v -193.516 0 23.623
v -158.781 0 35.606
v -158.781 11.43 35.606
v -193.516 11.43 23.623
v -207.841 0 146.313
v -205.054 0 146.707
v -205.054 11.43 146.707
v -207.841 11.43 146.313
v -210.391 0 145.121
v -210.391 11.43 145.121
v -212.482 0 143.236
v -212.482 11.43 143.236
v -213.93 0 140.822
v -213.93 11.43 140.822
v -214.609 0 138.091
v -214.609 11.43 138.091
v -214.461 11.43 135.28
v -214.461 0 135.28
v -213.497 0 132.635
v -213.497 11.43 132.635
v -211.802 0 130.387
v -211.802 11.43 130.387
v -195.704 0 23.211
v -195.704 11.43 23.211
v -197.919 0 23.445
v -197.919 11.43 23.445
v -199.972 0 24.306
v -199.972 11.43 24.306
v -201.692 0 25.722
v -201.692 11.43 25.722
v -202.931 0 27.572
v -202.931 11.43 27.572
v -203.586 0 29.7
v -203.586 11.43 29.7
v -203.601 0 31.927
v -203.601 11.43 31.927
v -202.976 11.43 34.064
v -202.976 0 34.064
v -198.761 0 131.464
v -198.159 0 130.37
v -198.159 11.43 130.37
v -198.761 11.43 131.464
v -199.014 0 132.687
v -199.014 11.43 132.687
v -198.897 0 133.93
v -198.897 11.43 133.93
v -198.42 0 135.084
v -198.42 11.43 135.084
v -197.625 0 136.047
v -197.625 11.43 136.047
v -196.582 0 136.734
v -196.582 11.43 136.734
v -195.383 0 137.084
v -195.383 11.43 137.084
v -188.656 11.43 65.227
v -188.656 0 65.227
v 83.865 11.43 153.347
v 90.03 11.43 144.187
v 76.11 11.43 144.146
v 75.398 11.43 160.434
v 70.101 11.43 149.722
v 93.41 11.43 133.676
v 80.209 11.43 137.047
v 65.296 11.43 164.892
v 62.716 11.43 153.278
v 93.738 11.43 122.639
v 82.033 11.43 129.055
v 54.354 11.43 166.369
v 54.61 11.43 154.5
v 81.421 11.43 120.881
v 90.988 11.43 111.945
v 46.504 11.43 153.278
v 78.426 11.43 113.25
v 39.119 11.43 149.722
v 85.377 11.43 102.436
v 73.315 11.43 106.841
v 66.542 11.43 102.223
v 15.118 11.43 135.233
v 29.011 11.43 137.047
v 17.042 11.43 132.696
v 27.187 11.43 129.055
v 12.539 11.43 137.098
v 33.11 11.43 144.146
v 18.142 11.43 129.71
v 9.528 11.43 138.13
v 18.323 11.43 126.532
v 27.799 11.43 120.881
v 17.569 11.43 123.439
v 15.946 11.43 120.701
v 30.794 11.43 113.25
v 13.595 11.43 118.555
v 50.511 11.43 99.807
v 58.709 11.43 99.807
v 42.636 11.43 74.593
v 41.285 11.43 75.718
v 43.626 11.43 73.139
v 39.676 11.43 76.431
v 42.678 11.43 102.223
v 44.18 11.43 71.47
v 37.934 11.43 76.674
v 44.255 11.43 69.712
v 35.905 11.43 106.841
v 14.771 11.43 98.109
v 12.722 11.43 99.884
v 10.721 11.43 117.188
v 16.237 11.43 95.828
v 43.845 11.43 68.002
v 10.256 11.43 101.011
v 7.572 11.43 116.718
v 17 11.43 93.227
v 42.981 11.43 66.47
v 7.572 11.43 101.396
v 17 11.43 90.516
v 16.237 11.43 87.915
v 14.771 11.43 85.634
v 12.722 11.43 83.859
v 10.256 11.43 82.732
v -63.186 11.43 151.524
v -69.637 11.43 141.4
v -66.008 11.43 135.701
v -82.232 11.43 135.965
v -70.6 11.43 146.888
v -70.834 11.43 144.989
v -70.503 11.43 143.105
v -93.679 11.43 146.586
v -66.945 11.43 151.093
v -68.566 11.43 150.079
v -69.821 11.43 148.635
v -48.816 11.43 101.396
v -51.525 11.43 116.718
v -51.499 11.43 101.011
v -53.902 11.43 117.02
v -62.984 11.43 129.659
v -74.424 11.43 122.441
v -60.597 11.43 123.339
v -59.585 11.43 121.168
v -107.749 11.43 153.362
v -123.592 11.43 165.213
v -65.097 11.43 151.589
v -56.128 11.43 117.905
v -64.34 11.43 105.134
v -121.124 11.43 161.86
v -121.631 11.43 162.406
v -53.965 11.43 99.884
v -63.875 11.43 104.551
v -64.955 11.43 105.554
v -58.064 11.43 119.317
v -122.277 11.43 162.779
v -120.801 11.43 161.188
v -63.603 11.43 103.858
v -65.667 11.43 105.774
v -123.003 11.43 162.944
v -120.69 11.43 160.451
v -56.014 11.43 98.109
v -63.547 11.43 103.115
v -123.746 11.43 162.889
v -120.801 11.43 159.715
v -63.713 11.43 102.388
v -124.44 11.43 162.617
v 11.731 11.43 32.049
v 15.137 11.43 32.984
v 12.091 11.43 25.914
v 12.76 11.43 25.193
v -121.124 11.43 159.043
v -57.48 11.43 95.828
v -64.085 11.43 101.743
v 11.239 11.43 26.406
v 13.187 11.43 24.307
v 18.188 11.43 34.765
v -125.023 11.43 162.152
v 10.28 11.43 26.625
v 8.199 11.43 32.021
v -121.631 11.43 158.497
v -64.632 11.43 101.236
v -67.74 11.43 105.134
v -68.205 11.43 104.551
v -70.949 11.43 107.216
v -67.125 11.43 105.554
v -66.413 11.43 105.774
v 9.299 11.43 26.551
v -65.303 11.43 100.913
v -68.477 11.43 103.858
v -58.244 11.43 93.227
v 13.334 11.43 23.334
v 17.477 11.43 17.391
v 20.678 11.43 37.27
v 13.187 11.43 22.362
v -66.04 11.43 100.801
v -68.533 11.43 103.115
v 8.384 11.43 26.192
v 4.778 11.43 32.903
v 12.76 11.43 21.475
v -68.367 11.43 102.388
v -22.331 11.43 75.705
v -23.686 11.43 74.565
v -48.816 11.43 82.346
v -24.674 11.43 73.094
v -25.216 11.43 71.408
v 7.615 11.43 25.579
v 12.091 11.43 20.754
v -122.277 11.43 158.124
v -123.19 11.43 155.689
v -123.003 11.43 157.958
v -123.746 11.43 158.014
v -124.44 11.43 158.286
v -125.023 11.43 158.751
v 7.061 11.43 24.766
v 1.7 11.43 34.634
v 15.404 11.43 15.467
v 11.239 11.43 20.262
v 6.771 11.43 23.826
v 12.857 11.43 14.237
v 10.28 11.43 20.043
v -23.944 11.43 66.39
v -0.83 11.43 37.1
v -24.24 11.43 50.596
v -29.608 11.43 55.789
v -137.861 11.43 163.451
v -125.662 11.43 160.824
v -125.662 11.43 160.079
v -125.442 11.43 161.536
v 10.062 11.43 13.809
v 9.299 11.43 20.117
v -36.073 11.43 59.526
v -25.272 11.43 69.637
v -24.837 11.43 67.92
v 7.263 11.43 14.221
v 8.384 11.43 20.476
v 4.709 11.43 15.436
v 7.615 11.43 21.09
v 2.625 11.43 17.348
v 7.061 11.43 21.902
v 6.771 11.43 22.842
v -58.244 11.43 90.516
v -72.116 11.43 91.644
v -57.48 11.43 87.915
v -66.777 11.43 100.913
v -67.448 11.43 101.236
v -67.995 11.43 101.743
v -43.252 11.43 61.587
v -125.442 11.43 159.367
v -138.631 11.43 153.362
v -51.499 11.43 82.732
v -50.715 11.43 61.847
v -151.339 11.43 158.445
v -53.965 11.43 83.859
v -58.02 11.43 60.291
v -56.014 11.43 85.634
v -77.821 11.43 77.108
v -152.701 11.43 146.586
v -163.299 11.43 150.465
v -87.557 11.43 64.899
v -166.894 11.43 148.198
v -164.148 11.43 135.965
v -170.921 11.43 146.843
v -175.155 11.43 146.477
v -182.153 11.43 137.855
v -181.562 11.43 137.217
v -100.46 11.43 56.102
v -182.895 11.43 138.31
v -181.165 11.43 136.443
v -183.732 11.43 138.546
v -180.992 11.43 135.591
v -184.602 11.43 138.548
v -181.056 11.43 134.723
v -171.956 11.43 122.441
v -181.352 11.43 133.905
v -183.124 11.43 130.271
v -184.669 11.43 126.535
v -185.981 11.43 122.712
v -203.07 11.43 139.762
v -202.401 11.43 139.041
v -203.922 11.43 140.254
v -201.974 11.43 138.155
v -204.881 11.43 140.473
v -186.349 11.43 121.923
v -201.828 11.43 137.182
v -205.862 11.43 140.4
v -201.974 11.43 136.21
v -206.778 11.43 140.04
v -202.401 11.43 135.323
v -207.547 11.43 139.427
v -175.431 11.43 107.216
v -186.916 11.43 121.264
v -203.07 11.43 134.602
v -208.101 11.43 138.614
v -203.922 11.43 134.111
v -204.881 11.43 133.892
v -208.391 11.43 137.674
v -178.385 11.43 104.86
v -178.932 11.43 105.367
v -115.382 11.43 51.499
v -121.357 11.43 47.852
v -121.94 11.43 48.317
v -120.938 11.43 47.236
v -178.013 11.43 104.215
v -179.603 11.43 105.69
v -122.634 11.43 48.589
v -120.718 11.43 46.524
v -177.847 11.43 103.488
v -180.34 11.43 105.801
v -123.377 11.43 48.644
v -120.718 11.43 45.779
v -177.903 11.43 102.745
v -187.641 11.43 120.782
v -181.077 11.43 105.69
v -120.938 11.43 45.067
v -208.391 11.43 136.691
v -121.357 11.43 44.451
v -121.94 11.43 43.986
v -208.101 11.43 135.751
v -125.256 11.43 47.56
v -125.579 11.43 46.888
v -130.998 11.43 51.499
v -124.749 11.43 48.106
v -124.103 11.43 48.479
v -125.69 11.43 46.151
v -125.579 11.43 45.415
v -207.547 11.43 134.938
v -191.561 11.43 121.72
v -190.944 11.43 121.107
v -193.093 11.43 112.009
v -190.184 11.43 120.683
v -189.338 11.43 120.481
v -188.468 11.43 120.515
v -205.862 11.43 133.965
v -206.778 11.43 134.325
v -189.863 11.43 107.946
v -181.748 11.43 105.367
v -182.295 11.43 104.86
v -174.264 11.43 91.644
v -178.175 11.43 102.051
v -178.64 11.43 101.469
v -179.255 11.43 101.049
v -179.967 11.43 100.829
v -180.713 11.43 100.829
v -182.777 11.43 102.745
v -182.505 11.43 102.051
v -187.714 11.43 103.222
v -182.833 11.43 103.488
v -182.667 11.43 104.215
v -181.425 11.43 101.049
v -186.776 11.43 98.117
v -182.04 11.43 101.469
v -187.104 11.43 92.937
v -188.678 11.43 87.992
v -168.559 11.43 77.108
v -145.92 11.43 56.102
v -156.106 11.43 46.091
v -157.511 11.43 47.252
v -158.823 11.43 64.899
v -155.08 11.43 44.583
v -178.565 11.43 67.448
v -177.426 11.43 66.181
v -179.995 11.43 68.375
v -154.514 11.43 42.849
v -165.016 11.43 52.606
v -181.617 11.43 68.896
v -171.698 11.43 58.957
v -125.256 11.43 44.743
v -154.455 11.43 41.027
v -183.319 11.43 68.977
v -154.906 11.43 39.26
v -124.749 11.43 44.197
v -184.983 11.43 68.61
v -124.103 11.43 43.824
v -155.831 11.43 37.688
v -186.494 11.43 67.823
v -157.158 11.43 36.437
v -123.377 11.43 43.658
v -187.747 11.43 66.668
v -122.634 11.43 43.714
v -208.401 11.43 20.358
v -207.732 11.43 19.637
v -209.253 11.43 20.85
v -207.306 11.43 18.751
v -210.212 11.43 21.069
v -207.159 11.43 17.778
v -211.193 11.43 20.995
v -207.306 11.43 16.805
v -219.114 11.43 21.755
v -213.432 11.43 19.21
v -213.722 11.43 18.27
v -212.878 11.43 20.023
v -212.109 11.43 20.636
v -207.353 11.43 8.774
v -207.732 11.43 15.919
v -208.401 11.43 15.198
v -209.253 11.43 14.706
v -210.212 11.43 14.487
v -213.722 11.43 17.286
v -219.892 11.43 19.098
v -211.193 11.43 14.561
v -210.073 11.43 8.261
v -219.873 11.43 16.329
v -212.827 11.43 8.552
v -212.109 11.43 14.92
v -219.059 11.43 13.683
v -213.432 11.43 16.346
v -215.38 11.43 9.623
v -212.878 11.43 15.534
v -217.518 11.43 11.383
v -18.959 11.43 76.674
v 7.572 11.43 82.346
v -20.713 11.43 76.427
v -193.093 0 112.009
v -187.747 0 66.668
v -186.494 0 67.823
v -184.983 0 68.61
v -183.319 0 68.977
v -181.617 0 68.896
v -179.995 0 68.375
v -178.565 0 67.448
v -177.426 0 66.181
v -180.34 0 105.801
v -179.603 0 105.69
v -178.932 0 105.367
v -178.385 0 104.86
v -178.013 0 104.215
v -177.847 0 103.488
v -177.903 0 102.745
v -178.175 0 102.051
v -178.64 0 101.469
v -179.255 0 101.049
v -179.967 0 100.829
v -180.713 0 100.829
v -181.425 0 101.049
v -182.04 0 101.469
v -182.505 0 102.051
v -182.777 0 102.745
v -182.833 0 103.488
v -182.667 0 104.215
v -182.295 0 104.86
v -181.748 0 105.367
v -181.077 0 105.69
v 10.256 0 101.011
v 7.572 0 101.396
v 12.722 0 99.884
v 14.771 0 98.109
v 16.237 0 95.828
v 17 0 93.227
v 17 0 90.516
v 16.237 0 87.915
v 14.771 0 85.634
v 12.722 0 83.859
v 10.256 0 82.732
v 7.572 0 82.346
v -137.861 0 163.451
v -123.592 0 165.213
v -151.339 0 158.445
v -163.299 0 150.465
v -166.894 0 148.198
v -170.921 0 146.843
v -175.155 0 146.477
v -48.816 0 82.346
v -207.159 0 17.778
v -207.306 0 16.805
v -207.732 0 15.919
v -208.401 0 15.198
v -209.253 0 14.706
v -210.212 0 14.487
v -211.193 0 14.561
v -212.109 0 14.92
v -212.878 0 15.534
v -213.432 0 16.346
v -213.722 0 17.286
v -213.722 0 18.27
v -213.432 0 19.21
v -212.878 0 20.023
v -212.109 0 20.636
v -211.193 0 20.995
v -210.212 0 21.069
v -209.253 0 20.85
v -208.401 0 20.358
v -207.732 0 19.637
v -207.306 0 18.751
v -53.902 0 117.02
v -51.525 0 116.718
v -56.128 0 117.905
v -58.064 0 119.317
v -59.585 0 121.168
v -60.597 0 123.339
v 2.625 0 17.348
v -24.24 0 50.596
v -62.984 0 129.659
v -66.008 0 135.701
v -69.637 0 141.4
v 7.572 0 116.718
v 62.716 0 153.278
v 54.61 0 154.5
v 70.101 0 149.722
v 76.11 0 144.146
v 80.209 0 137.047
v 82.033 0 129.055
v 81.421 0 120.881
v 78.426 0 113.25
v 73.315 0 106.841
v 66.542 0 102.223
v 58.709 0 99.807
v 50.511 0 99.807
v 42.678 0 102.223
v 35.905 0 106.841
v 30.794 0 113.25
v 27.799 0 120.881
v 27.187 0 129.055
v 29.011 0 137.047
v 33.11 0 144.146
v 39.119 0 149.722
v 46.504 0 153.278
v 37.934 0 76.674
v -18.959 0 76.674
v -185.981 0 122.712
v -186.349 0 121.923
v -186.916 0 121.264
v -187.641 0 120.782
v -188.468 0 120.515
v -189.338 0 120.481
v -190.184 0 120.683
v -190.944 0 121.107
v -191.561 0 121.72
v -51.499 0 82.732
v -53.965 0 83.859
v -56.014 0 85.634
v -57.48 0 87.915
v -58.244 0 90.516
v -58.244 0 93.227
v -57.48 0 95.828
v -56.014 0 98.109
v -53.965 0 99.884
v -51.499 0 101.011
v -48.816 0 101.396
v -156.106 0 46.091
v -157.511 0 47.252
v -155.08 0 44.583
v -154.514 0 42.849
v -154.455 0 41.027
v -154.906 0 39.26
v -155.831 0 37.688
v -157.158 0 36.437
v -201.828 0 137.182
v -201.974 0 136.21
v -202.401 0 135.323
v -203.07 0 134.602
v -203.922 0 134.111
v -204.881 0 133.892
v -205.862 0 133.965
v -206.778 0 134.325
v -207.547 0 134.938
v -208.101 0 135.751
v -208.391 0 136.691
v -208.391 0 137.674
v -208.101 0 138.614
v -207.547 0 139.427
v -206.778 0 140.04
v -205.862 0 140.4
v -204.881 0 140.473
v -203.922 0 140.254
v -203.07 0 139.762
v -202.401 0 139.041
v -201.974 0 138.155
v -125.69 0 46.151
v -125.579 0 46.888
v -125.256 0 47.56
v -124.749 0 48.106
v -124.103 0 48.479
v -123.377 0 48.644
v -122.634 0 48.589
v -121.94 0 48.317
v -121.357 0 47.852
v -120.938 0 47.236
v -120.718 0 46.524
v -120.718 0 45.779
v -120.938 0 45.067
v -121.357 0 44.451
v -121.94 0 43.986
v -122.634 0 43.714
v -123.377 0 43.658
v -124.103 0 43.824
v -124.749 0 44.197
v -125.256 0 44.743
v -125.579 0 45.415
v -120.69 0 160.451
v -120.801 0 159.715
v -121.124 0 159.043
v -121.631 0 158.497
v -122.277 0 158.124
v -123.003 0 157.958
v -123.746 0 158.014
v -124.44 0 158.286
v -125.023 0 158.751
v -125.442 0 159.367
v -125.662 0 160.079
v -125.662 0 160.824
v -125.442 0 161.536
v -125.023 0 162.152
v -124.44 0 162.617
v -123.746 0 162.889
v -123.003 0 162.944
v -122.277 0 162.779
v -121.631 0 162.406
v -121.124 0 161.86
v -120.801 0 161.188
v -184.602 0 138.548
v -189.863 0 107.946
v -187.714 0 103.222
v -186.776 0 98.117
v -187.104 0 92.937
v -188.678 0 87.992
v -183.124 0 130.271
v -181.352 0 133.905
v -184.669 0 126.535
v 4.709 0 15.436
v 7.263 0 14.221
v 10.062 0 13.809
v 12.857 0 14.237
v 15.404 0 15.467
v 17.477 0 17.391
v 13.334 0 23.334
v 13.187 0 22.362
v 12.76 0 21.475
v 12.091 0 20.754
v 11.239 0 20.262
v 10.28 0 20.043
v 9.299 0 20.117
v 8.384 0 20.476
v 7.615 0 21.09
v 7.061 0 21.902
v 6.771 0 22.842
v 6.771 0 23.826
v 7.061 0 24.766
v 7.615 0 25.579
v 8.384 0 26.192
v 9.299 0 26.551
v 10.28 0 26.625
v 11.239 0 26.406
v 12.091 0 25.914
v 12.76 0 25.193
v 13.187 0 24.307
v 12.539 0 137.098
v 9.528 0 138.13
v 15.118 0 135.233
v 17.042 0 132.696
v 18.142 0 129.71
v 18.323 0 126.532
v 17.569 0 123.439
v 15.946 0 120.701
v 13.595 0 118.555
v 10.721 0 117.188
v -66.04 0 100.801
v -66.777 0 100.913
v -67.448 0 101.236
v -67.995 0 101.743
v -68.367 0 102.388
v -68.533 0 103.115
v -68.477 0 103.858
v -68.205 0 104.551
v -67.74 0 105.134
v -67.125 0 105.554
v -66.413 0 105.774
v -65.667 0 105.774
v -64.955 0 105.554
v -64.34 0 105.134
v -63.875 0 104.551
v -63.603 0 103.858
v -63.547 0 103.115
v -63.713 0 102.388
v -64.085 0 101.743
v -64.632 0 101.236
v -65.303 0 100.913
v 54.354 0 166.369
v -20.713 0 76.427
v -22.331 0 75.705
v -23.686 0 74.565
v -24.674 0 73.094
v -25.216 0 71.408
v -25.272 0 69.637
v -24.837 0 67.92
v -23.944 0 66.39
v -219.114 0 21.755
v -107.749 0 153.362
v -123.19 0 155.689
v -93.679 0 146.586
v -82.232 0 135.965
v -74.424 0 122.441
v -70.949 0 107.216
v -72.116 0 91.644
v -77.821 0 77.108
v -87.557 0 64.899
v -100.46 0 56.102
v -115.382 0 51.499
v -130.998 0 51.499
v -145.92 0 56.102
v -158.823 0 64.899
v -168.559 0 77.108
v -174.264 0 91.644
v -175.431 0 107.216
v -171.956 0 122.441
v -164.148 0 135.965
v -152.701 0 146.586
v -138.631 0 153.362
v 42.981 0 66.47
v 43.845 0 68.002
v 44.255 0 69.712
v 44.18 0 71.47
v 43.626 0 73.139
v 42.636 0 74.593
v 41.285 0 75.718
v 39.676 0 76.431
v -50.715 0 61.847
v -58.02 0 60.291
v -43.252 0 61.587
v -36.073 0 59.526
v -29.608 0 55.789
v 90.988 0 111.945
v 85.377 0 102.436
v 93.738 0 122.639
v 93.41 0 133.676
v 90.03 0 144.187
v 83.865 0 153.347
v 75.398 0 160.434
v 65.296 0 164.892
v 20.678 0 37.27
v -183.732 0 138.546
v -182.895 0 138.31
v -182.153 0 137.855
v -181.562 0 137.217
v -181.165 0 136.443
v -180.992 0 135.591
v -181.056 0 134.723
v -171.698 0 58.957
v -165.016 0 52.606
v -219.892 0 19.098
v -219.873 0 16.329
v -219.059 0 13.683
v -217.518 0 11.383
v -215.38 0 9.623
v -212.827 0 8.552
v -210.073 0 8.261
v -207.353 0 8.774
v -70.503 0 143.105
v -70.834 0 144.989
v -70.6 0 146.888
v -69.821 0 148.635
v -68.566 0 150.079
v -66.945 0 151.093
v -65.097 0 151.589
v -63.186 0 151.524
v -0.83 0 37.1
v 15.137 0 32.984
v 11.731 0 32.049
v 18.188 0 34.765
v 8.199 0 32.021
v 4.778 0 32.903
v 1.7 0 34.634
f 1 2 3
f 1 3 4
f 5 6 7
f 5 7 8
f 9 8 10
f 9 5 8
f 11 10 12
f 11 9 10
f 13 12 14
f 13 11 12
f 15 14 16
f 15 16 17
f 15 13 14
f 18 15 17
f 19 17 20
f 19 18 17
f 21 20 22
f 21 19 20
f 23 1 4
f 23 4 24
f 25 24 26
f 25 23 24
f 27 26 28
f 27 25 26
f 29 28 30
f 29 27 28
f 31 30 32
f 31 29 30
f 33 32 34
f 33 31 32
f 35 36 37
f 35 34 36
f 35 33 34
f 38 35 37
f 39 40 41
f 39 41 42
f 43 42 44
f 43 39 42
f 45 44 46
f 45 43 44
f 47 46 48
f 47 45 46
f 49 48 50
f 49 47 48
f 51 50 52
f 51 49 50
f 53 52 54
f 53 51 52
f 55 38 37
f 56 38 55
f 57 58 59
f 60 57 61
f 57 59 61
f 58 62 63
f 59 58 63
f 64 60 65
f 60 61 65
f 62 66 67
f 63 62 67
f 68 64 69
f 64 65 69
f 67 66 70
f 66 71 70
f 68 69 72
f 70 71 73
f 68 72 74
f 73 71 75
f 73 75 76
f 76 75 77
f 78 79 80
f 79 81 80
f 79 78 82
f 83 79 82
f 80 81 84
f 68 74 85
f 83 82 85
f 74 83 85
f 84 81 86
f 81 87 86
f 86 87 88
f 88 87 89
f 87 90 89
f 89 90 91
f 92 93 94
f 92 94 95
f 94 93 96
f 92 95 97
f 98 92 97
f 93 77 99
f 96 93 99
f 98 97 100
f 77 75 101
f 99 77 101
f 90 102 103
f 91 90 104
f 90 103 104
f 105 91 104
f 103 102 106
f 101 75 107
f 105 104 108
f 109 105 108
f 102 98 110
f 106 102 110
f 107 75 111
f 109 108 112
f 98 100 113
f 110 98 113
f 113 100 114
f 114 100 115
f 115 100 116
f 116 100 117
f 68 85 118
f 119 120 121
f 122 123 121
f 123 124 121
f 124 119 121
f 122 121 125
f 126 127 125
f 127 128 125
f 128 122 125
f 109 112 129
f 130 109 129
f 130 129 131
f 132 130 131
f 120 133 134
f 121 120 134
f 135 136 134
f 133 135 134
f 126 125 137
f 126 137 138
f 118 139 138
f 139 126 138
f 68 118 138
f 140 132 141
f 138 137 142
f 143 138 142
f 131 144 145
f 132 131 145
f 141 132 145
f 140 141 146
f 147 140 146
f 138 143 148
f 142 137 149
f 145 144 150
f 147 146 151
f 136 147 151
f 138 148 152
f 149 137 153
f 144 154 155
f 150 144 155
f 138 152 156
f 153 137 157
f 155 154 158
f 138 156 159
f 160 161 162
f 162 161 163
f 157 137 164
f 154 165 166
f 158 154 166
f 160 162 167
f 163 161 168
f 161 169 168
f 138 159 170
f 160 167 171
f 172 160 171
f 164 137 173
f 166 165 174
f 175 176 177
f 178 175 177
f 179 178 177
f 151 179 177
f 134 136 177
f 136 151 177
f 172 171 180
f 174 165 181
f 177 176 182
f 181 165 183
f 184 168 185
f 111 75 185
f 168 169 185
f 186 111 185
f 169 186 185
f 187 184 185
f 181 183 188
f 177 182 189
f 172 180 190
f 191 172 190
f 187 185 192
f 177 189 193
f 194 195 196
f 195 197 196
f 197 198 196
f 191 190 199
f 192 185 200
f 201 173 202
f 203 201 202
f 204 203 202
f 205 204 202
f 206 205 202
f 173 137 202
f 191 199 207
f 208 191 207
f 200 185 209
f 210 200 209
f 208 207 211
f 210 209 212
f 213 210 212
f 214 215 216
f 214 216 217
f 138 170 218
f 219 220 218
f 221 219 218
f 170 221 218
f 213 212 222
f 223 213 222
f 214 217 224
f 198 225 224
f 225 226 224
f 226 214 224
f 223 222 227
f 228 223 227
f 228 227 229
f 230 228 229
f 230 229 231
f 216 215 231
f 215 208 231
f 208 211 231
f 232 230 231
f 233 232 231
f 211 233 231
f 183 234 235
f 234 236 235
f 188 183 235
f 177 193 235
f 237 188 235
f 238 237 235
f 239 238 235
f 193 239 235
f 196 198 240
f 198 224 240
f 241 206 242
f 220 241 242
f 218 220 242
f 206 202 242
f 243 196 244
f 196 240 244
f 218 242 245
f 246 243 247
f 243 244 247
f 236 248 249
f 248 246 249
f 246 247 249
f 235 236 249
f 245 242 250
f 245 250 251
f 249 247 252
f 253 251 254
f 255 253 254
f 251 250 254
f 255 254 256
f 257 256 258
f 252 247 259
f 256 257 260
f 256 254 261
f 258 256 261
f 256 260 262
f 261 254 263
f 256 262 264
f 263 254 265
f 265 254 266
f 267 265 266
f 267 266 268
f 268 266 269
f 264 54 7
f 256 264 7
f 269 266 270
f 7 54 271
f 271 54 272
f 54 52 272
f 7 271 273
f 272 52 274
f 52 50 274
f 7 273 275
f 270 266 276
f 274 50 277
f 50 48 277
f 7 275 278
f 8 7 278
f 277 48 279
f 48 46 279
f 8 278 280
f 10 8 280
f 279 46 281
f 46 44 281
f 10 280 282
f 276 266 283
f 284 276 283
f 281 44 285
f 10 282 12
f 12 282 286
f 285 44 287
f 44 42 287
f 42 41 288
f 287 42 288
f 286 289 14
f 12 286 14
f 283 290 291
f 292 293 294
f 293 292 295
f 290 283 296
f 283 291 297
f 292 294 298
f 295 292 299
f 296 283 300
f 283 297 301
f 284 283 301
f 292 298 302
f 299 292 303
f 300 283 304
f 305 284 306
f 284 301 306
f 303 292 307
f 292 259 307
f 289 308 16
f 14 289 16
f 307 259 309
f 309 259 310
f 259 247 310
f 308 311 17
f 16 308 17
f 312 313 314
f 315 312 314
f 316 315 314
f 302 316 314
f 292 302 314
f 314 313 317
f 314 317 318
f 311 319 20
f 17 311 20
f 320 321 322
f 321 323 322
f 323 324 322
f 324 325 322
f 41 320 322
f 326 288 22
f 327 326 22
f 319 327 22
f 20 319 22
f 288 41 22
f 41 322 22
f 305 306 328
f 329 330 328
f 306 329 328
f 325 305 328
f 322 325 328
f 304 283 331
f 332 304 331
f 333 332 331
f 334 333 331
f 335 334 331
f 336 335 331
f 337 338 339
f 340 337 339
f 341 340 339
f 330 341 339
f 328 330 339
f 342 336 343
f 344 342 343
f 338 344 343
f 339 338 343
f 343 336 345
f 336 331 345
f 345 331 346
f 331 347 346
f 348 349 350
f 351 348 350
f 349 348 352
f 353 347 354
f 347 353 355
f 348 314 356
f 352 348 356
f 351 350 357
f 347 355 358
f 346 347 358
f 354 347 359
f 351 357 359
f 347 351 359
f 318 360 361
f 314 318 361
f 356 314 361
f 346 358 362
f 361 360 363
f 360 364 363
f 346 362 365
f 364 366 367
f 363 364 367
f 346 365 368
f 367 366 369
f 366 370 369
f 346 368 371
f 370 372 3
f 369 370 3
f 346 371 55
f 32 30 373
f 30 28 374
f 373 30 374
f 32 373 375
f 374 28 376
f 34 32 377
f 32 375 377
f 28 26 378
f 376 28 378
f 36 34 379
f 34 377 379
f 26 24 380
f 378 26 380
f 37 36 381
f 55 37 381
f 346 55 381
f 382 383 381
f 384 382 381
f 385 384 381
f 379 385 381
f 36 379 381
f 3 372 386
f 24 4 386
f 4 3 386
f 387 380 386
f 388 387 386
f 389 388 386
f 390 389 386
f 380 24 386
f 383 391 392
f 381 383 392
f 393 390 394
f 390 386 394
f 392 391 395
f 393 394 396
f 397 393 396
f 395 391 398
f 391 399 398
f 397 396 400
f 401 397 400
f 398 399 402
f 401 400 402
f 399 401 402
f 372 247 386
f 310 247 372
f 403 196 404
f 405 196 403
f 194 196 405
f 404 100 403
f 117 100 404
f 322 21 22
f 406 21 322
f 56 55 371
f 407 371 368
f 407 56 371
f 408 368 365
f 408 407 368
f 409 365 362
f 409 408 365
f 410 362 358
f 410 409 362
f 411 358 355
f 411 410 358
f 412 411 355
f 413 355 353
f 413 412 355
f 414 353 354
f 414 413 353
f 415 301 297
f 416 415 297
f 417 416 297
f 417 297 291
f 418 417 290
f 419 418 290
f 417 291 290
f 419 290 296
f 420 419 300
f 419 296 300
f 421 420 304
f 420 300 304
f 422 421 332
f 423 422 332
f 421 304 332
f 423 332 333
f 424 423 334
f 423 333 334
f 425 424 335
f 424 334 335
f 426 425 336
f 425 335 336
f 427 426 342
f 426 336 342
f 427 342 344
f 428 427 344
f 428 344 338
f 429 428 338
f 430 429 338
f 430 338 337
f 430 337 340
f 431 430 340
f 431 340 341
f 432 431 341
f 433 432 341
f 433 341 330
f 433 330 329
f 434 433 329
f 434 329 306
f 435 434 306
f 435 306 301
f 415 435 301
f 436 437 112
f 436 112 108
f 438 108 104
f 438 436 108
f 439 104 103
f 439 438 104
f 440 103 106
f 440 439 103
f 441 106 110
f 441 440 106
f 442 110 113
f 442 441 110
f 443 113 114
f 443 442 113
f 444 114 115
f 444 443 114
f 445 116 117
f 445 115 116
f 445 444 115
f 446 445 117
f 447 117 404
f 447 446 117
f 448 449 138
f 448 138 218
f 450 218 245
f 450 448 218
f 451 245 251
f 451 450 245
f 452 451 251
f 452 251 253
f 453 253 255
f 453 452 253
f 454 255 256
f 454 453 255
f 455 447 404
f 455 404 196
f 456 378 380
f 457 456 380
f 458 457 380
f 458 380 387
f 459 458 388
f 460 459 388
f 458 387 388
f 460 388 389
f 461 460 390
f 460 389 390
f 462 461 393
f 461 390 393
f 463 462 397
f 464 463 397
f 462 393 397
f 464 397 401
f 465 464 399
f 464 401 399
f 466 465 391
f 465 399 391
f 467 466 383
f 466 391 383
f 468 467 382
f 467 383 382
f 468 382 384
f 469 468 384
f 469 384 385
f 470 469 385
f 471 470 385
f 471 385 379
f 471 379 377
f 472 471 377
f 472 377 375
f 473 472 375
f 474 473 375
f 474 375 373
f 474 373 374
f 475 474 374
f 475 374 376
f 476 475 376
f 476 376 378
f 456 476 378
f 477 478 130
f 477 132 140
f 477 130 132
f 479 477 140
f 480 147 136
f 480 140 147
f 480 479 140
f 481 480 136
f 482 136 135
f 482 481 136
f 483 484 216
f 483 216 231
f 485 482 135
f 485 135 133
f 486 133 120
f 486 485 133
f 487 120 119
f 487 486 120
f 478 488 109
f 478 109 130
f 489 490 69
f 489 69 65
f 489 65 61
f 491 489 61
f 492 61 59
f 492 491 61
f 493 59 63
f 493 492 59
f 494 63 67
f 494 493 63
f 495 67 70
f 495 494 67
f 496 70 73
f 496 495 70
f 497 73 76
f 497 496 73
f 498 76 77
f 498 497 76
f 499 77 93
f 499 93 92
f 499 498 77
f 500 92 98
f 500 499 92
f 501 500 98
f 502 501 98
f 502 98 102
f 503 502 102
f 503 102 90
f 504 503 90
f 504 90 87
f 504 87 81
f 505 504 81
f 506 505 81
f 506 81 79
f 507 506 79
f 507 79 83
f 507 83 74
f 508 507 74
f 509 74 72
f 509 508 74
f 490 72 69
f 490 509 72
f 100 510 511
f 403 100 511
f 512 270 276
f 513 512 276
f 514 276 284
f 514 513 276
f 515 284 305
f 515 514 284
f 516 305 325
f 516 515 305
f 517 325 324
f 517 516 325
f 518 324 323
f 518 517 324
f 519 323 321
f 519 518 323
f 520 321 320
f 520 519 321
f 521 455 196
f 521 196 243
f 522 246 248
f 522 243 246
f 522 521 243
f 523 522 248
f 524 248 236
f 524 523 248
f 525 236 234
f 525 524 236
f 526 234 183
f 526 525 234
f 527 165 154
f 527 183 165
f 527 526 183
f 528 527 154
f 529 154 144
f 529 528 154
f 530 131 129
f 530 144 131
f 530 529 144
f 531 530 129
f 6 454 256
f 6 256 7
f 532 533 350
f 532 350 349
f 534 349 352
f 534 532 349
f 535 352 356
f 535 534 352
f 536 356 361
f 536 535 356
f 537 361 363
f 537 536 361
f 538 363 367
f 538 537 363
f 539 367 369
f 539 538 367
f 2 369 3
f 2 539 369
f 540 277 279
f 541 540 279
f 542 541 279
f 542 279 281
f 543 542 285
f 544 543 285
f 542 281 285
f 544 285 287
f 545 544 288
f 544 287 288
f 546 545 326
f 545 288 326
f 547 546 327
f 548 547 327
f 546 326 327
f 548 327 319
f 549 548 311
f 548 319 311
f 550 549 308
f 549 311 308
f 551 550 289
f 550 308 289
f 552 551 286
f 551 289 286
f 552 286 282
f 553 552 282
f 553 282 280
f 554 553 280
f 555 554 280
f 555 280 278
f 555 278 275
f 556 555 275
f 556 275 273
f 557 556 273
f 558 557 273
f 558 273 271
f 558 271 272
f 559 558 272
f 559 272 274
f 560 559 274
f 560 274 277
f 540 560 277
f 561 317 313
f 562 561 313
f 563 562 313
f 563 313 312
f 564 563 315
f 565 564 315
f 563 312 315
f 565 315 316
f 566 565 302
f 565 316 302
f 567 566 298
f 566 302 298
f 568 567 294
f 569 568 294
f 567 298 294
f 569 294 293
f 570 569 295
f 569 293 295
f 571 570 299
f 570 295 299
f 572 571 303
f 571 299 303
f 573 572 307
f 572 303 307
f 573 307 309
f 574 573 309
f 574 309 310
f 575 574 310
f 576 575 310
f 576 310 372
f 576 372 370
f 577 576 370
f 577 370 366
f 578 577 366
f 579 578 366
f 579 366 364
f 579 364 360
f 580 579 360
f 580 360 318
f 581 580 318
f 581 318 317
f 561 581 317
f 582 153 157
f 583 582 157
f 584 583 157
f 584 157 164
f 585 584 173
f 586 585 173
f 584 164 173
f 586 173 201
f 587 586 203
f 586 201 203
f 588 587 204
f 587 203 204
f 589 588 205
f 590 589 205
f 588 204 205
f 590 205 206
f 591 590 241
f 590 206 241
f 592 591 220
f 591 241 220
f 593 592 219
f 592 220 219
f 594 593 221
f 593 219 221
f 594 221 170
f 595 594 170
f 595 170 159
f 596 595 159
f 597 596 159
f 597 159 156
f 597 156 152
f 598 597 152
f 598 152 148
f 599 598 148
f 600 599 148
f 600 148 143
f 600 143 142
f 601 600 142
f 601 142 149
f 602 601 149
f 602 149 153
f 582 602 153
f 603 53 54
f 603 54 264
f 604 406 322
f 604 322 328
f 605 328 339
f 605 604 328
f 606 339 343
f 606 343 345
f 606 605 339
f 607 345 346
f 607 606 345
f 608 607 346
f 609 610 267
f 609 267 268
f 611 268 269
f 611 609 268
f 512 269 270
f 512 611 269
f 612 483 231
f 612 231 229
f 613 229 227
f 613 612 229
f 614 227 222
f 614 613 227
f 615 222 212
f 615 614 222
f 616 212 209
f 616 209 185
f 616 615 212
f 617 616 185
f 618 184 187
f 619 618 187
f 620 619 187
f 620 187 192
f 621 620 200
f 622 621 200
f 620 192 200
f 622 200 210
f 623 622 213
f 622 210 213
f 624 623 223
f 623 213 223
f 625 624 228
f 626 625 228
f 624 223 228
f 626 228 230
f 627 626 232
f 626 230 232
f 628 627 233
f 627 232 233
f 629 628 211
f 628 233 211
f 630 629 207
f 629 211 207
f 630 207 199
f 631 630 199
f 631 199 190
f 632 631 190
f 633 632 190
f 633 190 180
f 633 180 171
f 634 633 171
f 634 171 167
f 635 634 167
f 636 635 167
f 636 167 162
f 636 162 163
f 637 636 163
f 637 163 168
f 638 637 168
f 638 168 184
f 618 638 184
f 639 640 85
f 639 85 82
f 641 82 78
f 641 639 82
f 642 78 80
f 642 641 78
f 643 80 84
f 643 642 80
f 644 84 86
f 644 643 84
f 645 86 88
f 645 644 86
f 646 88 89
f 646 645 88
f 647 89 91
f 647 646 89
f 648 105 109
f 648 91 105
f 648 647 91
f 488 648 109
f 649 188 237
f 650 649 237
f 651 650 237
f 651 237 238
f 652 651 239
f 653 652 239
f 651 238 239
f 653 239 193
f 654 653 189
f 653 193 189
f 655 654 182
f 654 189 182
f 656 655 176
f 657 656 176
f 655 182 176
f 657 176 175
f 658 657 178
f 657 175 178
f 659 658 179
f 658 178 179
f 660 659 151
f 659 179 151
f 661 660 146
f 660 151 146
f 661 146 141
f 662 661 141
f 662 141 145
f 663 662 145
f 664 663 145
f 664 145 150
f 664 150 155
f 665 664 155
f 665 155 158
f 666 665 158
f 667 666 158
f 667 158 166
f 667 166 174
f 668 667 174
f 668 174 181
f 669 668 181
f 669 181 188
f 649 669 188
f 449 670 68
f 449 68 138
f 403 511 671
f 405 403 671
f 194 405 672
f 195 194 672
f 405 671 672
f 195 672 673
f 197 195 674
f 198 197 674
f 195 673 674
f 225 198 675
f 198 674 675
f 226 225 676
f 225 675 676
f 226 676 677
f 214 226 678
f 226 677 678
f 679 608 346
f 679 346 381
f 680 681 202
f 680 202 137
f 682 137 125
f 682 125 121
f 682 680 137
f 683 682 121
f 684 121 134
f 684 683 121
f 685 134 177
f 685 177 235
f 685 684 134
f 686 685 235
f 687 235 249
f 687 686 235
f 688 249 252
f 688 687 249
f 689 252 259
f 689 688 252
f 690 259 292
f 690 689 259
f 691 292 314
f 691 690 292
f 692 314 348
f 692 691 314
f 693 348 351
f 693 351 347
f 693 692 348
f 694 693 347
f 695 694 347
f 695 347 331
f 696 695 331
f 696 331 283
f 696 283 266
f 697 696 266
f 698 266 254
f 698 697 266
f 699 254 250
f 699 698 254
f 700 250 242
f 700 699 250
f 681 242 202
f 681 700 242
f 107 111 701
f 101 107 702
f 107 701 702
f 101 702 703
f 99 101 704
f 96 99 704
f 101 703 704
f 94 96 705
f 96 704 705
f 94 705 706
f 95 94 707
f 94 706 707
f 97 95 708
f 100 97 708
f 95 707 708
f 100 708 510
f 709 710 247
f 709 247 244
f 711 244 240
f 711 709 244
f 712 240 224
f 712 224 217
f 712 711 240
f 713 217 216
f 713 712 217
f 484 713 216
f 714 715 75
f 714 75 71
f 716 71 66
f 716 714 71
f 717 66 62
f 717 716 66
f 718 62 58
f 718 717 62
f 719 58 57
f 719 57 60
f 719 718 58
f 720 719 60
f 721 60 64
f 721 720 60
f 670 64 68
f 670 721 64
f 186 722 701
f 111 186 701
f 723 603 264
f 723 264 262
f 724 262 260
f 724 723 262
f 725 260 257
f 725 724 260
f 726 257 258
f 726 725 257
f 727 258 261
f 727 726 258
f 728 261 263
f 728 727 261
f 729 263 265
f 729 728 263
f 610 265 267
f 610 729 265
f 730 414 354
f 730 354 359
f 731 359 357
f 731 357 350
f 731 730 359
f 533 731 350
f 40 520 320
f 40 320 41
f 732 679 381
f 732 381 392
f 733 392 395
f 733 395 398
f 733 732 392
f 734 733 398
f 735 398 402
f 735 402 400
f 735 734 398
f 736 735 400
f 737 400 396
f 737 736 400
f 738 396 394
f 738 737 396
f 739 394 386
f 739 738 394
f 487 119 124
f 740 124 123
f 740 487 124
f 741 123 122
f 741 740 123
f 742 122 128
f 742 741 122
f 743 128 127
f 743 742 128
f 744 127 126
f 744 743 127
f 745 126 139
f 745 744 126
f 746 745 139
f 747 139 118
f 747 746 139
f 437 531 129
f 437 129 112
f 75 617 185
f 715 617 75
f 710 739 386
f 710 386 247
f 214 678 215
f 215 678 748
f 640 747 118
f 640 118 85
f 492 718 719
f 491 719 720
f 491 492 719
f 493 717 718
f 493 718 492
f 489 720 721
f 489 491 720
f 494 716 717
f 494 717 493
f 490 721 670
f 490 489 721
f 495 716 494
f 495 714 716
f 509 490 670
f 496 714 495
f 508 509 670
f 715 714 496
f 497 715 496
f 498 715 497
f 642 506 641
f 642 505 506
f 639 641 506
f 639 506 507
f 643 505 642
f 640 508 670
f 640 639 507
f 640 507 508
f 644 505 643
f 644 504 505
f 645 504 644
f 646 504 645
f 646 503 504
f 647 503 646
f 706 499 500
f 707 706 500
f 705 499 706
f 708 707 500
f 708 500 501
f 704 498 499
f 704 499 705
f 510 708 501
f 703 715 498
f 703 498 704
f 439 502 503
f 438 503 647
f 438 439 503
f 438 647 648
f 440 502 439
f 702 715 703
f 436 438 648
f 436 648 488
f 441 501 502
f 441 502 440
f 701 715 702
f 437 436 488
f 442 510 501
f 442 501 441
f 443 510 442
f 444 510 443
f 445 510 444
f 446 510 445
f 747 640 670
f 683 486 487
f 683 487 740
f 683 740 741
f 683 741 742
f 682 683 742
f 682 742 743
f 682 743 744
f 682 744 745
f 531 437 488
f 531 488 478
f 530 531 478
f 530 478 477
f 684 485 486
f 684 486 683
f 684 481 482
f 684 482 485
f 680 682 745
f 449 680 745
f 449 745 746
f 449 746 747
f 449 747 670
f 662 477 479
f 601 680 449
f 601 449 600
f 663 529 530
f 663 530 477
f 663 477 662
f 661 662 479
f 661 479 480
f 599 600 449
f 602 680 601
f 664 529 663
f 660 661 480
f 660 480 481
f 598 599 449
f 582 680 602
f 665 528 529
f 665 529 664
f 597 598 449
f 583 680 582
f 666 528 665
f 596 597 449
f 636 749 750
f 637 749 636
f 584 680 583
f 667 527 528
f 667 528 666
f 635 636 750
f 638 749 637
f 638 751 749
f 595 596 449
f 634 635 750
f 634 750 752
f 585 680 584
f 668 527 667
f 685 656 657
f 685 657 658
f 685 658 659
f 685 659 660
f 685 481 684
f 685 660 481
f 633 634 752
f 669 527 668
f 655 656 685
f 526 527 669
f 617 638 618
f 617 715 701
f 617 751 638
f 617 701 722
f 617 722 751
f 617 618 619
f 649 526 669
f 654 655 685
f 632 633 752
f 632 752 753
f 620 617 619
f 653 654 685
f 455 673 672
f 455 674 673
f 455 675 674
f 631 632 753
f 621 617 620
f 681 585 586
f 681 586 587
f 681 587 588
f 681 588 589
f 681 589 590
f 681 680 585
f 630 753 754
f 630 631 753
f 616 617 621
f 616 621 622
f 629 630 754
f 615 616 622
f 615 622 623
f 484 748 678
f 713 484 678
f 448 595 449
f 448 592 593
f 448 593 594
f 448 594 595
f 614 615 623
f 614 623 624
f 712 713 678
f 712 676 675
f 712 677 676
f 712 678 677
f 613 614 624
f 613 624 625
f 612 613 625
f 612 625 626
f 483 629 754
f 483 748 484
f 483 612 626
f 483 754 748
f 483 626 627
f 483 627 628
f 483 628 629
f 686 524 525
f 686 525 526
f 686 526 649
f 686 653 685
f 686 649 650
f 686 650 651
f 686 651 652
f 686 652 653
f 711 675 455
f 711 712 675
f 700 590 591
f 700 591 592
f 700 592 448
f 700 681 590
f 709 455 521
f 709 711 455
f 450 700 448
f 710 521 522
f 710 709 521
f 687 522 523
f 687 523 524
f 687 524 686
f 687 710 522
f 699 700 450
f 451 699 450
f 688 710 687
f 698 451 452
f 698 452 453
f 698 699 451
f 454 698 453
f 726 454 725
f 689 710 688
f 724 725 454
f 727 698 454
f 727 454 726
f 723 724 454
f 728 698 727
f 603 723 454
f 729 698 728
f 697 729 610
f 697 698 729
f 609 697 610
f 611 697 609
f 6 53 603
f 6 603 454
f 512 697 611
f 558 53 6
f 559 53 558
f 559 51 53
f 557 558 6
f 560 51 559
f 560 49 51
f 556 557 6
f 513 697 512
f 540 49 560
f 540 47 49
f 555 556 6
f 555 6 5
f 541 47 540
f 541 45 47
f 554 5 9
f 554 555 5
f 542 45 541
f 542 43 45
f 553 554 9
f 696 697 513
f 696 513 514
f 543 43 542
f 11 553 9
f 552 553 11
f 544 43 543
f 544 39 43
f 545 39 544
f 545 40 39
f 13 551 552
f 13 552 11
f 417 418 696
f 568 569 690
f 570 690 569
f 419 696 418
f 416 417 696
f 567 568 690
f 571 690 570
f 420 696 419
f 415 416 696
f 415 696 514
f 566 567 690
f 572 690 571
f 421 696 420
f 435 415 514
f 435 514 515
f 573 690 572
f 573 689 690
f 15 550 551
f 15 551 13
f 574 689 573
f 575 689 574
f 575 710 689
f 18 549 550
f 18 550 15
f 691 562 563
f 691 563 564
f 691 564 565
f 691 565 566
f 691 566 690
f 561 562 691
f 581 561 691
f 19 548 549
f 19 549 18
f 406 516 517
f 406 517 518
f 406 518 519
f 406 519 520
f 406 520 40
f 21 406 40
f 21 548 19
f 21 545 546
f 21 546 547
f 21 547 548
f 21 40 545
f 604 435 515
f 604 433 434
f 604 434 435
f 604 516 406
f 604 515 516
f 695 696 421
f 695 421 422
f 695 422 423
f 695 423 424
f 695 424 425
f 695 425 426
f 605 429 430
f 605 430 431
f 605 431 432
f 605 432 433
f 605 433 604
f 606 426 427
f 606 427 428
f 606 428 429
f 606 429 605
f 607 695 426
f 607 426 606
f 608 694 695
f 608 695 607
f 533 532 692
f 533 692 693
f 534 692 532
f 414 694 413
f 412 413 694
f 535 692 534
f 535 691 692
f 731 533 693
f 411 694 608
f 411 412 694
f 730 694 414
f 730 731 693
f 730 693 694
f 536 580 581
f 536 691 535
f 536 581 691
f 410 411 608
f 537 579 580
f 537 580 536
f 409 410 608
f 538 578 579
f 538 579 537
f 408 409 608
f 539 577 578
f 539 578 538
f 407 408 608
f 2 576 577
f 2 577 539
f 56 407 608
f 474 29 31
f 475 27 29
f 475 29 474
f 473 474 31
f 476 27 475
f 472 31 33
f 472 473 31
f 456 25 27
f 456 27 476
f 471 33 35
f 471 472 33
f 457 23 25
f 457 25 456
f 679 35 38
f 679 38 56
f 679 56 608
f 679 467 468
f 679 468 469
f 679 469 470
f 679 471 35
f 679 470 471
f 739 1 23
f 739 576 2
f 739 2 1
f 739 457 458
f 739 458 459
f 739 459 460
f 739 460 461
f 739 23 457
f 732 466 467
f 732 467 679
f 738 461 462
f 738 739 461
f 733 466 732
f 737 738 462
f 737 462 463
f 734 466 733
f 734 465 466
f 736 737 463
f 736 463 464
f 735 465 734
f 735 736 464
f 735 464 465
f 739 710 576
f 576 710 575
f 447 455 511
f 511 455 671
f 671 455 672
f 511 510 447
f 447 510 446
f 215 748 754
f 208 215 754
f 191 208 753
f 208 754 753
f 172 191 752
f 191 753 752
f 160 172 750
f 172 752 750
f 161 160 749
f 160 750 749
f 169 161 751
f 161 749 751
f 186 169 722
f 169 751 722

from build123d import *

# Parameters (mm, degrees)
SKETCH1_R             = 52.3875
SKETCH1_R_2           = 27.49999999
BOSS_EXTRUDE1_DEPTH   = 11.43
M6_CLEARANCE_HOLE1_D  = 6.6
F_5_0MM_DOWEL_HOLE1_D = 5
CIRPATTERN1_COUNT     = 4
CUT_EXTRUDE1_DEPTH    = 277.04812471
CUT_EXTRUDE2_DEPTH    = 277.04812471


with BuildPart() as part:
    # Sketch1 → Boss-Extrude1 (new body)
    with BuildSketch(Plane(origin=(0, 0, 0), x_dir=(1, 0, 0), z_dir=(0, 1, 0))):
        with BuildLine():
            Line((-207.352675902, -8.773903901), (-58.019530206, -60.290898352))
            ThreePointArc((-58.019530206, -60.290898352), (-39.599212065, -60.776397748), (-24.240097525, -50.595954211))
            Line((-24.240097525, -50.595954211), (2.624995443, -17.347825368))
            ThreePointArc((2.624995443, -17.347825368), (10.061549983, -13.809238065), (17.477288292, -17.391244328))
            Line((17.477288292, -17.391244328), (85.376811489, -102.435794114))
            ThreePointArc((85.376811489, -102.435794114), (90.030312626, -144.187156643), (54.354134393, -166.369168556))
            Line((54.354134393, -166.369168556), (-123.592369302, -165.212669907))
            ThreePointArc((-123.592369302, -165.212669907), (-144.74612022, -161.34018293), (-163.299086644, -150.465222234))
            ThreePointArc((-163.299086644, -150.465222234), (-168.867064733, -147.400846083), (-175.155117318, -146.477170878))
            Line((-175.155117318, -146.477170878), (-205.054266123, -146.707116576))
            ThreePointArc((-205.054266123, -146.707116576), (-213.929698734, -140.822073907), (-211.802405396, -130.387436669))
            Line((-211.802405396, -130.387436669), (-193.092894011, -112.008542149))
            ThreePointArc((-193.092894011, -112.008542149), (-187.088381157, -100.6982482), (-188.678110669, -87.991962988))
            Line((-188.678110669, -87.991962988), (-219.113977597, -21.755141651))
            ThreePointArc((-219.113977597, -21.755141651), (-217.51766362, -11.382814462), (-207.352675902, -8.773903901))
        make_face()
        with Locations(Location((-123.19, -103.30147742, 0), (0, 0, 270))):
            Circle(SKETCH1_R, mode=Mode.SUBTRACT)
        with Locations(Location((54.61, -127, 0), (0, 0, 270))):
            Circle(SKETCH1_R_2, mode=Mode.SUBTRACT)
    extrude(amount=BOSS_EXTRUDE1_DEPTH)

    # M6 Clearance Hole1 (through all)
    with Locations(Plane(origin=(0, 0, 0), x_dir=(-1, 0, 0), z_dir=(0, -1, 0))):
        with Locations((-10.033704867, -23.334197365), (210.458966133, -17.778157673), (205.127517975, -137.182398252)):
            Hole(M6_CLEARANCE_HOLE1_D / 2)

    # Ø5.0mm Dowel Hole1 (through all)
    with Locations(Plane(origin=(0, 0, 0), x_dir=(-1, 0, 0), z_dir=(0, -1, 0))):
        with Locations((123.19, -160.45147742)):
            f_5_0mm_dowel_hole1 = Hole(F_5_0MM_DOWEL_HOLE1_D / 2)

    # CirPattern1: Ø5.0mm Dowel Hole1 ×4 about axis
    cirpattern1_axis = Axis((-123.19, 0, 103.30147742), (0, 1, 0))
    for i in range(1, CIRPATTERN1_COUNT):
        add(f_5_0mm_dowel_hole1.rotate(cirpattern1_axis, i * 360 / CIRPATTERN1_COUNT), mode=Mode.SUBTRACT)

    # Sketch6 → Cut-Extrude1 (cut, through all)
    with BuildSketch(Plane.XZ):
        with BuildLine():
            Line((-23.944258321, 66.390441023), (-0.829614149, 37.099993387))
            ThreePointArc((-0.829614149, 37.099993387), (9.965816041, 31.919797806), (20.677978855, 37.270060145))
            Line((20.677978855, 37.270060145), (42.980839674, 66.469760223))
            ThreePointArc((42.980839674, 66.469760223), (43.626492897, 73.139052969), (37.934473227, 76.674197365))
            Line((37.934473227, 76.674197365), (-18.959475373, 76.674197365))
            ThreePointArc((-18.959475373, 76.674197365), (-24.673574285, 73.093957935), (-23.944258321, 66.390441023))
        make_face()
        with BuildLine():
            Line((-202.975515938, 34.064204485), (-188.656140545, 65.227105539))
            ThreePointArc((-188.656140545, 65.227105539), (-183.31891043, 68.976517371), (-177.425759363, 66.18100581))
            ThreePointArc((-177.425759363, 66.18100581), (-168.46871459, 55.664464381), (-157.511328264, 47.252450377))
            ThreePointArc((-157.511328264, 47.252450377), (-154.454895213, 41.026593051), (-158.781442678, 35.605885581))
            Line((-158.781442678, 35.605885581), (-193.515753631, 23.623232324))
            ThreePointArc((-193.515753631, 23.623232324), (-201.691580607, 25.721611775), (-202.975515938, 34.064204485))
        make_face()
        with BuildLine():
            Line((-195.382759208, 137.08408238), (-184.602414462, 138.548107412))
            ThreePointArc((-184.602414462, 138.548107412), (-181.561941078, 137.21737146), (-181.352428173, 133.905054912))
            ThreePointArc((-181.352428173, 133.905054912), (-183.92504724, 128.415239444), (-185.980839898, 122.711717787))
            ThreePointArc((-185.980839898, 122.711717787), (-188.468463156, 120.514659048), (-191.560851772, 121.719843357))
            Line((-191.560851772, 121.719843357), (-198.159072812, 130.369853834))
            ThreePointArc((-198.159072812, 130.369853834), (-198.701393345, 134.525214763), (-195.382759208, 137.08408238))
        make_face()
    extrude(amount=-CUT_EXTRUDE1_DEPTH, mode=Mode.SUBTRACT)

    # Sketch7 → Cut-Extrude2 (cut, through all)
    with BuildSketch(Plane.XZ):
        with BuildLine():
            Line((-48.815667356, 101.39647742), (7.572332644, 101.39647742))
            ThreePointArc((7.572332644, 101.39647742), (17.097332644, 91.87147742), (7.572332644, 82.34647742))
            Line((7.572332644, 82.34647742), (-48.815667356, 82.34647742))
            ThreePointArc((-48.815667356, 82.34647742), (-58.340667356, 91.87147742), (-48.815667356, 101.39647742))
        make_face()
        with BuildLine():
            Line((-63.185512617, 151.524232803), (9.527948512, 138.12987842))
            ThreePointArc((9.527948512, 138.12987842), (18.322585695, 126.531617281), (7.572332644, 116.718495252))
            Line((7.572332644, 116.718495252), (-51.525154545, 116.718495252))
            ThreePointArc((-51.525154545, 116.718495252), (-57.140513894, 118.54977285), (-60.59665397, 123.339442362))
            ThreePointArc((-60.59665397, 123.339442362), (-64.418746701, 132.718934684), (-69.636607751, 141.399786896))
            ThreePointArc((-69.636607751, 141.399786896), (-69.82125671, 148.634919104), (-63.185512617, 151.524232803))
        make_face()
    extrude(amount=-CUT_EXTRUDE2_DEPTH, mode=Mode.SUBTRACT)


solid = part.part
